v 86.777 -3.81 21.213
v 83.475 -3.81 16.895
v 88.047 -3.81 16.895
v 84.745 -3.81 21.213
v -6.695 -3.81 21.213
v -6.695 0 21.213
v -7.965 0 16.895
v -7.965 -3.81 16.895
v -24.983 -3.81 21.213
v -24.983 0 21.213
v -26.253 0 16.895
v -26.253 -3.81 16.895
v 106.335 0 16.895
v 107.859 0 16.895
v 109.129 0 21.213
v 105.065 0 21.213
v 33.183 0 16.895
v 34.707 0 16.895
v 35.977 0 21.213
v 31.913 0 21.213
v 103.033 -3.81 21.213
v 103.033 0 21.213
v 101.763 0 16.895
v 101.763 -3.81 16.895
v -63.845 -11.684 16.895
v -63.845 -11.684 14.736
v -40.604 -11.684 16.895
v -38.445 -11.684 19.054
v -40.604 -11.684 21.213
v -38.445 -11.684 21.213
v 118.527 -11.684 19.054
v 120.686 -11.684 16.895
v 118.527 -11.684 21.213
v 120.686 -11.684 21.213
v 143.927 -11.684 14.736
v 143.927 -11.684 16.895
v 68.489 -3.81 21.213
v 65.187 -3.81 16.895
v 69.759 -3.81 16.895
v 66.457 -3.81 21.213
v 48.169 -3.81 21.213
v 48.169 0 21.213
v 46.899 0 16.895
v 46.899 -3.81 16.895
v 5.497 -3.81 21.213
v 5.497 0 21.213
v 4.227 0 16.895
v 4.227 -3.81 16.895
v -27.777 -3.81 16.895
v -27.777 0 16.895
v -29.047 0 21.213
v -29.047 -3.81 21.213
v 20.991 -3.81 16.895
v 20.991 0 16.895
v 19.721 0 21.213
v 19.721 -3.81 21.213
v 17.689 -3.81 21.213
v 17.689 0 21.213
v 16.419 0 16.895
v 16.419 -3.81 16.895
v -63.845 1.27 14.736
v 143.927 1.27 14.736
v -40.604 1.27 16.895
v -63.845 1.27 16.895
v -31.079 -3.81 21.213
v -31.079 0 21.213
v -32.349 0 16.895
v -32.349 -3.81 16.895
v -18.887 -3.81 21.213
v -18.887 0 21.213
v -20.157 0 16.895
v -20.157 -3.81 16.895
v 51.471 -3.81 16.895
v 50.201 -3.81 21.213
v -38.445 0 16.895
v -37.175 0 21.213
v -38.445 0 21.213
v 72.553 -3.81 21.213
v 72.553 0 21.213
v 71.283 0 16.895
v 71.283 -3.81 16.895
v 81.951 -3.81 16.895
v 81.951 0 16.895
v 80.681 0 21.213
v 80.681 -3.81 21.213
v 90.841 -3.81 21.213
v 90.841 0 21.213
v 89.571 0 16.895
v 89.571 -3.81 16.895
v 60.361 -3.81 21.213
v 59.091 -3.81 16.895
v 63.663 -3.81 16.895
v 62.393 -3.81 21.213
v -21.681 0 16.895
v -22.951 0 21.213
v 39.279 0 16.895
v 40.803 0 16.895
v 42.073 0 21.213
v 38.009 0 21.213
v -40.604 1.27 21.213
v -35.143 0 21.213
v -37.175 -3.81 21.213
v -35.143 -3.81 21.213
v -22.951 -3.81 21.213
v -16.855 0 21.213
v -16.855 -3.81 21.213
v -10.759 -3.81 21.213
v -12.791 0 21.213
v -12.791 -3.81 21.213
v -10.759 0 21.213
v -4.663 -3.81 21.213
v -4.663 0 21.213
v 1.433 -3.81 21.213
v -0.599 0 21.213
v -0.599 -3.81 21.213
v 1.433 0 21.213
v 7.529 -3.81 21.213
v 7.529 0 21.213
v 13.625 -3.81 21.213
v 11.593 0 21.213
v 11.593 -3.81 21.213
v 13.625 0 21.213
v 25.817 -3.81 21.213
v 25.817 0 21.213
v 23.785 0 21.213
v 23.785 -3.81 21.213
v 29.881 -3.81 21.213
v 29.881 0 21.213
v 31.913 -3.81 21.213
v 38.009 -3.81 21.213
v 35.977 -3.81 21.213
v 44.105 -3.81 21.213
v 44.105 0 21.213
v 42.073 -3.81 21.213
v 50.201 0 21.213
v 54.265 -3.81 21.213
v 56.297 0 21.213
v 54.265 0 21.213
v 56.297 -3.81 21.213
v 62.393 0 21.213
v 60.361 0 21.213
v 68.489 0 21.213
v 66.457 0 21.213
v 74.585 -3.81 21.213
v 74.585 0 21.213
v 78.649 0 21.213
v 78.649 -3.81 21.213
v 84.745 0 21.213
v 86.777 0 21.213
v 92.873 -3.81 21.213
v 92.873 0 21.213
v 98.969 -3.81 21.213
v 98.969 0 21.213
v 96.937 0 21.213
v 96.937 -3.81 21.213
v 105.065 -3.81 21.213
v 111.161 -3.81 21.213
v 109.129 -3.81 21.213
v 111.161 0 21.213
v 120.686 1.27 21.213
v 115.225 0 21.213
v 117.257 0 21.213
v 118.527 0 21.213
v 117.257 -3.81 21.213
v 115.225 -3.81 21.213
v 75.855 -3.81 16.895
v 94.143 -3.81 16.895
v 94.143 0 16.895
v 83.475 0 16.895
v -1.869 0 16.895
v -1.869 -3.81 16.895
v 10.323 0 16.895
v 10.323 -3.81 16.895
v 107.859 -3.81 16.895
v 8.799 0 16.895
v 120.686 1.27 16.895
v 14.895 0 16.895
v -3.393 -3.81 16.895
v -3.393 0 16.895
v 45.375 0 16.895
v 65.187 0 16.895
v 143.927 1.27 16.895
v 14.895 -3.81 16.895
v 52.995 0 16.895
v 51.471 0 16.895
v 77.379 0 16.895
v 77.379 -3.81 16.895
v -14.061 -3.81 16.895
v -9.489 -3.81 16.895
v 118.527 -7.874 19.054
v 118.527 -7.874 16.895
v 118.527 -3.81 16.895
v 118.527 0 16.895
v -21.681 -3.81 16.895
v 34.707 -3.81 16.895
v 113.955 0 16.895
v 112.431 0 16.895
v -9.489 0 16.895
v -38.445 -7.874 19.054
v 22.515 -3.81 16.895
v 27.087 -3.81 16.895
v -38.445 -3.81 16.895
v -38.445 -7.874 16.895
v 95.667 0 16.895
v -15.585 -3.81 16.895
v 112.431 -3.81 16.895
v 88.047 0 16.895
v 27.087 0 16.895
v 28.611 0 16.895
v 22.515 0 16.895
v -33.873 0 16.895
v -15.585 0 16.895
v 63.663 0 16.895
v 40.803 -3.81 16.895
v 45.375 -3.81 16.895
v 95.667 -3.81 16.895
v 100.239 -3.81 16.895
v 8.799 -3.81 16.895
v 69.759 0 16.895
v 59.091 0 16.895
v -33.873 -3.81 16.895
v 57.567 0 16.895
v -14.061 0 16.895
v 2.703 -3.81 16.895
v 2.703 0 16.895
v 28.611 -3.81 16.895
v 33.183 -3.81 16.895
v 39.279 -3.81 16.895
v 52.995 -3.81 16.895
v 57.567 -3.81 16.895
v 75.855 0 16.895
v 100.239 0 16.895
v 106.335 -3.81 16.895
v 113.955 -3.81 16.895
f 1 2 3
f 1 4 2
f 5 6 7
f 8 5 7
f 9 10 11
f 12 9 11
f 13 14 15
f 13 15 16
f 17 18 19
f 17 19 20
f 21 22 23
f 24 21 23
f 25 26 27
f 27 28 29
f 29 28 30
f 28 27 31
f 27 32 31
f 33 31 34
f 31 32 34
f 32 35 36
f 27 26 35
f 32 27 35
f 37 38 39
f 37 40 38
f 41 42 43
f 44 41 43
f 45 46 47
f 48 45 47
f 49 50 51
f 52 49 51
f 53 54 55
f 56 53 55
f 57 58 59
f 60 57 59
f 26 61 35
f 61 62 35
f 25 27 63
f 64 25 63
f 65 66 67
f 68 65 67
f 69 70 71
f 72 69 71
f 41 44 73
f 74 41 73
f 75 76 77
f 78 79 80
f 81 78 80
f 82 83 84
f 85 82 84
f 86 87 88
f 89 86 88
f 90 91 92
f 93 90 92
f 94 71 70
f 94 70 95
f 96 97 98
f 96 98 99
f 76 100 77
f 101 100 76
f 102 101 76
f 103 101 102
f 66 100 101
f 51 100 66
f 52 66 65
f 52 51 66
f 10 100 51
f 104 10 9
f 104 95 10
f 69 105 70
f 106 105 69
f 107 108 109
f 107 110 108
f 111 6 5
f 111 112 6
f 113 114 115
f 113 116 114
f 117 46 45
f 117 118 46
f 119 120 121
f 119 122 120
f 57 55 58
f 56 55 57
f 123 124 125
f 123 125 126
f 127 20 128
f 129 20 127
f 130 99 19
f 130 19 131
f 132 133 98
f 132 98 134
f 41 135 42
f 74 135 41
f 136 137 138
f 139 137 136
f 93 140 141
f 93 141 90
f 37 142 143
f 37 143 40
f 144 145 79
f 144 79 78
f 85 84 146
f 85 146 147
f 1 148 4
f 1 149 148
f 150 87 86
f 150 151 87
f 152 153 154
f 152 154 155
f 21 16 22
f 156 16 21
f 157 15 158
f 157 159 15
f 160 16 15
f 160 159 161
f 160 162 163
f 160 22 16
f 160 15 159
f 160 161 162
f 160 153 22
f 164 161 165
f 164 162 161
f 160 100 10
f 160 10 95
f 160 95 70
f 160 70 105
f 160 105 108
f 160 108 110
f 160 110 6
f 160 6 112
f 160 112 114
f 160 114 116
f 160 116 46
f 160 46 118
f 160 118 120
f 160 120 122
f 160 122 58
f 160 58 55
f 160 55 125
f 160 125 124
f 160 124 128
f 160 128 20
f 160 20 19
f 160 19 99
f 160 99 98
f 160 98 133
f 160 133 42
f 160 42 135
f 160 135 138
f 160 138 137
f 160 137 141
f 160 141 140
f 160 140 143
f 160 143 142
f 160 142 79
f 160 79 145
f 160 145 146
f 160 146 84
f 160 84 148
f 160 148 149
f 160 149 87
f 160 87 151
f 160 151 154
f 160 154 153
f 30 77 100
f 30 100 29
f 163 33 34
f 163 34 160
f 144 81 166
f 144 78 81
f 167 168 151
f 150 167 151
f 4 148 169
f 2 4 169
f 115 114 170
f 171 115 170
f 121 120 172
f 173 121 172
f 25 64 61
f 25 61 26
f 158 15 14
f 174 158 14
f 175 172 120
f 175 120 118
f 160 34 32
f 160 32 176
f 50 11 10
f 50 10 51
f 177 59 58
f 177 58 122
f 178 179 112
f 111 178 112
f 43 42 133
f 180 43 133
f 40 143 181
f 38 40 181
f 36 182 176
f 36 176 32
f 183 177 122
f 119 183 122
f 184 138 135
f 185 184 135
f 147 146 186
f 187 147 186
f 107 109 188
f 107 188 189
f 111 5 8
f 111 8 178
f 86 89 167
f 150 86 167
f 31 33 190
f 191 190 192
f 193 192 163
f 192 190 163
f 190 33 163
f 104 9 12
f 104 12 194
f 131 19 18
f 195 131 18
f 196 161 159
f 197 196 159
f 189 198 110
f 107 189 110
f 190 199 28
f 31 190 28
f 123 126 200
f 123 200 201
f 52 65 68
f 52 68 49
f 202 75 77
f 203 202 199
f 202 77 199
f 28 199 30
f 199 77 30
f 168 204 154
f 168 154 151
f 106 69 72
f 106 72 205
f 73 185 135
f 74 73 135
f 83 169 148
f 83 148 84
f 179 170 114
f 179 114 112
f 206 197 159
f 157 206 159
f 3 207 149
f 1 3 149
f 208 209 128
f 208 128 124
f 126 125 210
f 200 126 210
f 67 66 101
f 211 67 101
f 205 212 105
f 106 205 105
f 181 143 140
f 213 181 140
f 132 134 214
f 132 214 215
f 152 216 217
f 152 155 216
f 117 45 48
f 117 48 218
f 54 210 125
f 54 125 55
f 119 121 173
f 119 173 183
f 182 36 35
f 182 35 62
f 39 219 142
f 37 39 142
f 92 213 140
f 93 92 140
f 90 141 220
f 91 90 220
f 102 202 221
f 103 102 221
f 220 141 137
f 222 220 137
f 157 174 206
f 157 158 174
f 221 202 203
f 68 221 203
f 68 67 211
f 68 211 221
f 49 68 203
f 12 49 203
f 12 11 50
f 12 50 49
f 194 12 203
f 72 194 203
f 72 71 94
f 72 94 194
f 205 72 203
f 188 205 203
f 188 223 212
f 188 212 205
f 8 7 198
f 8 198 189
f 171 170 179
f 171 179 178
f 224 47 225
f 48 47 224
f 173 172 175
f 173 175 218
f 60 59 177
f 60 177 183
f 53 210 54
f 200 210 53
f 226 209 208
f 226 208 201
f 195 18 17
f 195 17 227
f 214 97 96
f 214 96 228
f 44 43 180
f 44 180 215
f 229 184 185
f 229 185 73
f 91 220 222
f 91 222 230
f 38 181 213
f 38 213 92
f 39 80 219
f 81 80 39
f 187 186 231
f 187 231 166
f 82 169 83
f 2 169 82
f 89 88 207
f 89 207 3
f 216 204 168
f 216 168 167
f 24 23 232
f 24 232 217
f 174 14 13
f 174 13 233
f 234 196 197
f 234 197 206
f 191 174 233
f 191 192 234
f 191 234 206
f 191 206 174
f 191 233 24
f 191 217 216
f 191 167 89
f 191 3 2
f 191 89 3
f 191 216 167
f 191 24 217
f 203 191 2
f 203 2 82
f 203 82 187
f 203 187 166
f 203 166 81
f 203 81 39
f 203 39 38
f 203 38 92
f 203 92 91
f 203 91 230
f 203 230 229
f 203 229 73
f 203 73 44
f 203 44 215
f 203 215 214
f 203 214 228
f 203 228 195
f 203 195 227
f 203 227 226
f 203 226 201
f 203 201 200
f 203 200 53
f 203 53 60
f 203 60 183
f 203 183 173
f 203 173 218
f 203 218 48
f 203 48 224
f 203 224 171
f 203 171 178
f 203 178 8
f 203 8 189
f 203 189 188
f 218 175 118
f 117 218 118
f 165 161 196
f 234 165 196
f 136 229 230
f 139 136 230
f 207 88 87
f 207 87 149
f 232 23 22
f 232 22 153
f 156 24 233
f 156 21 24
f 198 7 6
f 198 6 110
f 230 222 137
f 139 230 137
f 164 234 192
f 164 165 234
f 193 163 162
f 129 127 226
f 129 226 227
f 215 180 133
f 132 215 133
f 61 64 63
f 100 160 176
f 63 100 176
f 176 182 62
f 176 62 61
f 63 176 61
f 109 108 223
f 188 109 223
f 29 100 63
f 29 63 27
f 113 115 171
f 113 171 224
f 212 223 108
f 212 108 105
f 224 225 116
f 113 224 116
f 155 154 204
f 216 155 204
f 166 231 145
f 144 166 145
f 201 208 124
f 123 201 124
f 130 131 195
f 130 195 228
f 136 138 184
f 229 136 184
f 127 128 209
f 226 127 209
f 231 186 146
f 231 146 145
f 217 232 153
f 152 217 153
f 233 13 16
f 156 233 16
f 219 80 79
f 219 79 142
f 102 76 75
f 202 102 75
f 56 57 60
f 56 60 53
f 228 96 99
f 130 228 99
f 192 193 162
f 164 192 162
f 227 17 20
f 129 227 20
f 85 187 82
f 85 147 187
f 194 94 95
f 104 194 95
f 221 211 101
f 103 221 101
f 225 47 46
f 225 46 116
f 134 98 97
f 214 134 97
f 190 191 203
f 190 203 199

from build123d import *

# Parameters (mm, degrees)
F1_DEPTH  = 3.81
F5_DEPTH  = 156.972
F7_DEPTH  = 1.27
F9_W      = 12.954
F9_H      = 2.159
F9_H_2    = 4.318
F10_DEPTH = 2.159
F11_DEPTH = 25.4
F12_W     = 12.954
F12_H     = 4.318
F12_H_2   = 2.159
F13_DEPTH = 2.159
F14_DEPTH = 25.4


with BuildPart() as f1:
    # F0 (on Front) → F1 (new body)
    with BuildSketch(Plane.XZ):
        Polygon((-37.1748663006, 21.2125933835), (-38.4448663006, 16.8945933835), (-33.8728663006, 16.8945933835), (-35.1428663006, 21.2125933835), align=None)
        Polygon((-33.8728663006, 16.8945933835), (-38.4448663006, 16.8945933835), (-38.4448663006, 14.7355933835), (118.5271336994, 14.7355933835), (118.5271336994, 16.8945933835), (113.9551336994, 16.8945933835), (112.4311336994, 16.8945933835), (107.8591336994, 16.8945933835), (106.3351336994, 16.8945933835), (101.7631336994, 16.8945933835), (100.2391336994, 16.8945933835), (95.6671336994, 16.8945933835), (94.1431336994, 16.8945933835), (89.5711336994, 16.8945933835), (88.0471336994, 16.8945933835), (83.4751336994, 16.8945933835), (81.9511336994, 16.8945933835), (77.3791336994, 16.8945933835), (75.8551336994, 16.8945933835), (71.2831336994, 16.8945933835), (69.7591336994, 16.8945933835), (65.1871336994, 16.8945933835), (63.6631336994, 16.8945933835), (59.0911336994, 16.8945933835), (57.5671336994, 16.8945933835), (52.9951336994, 16.8945933835), (51.4711336994, 16.8945933835), (46.8991336994, 16.8945933835), (45.3751336994, 16.8945933835), (40.8031336994, 16.8945933835), (39.2791336994, 16.8945933835), (34.7071336994, 16.8945933835), (33.1831336994, 16.8945933835), (28.6111336994, 16.8945933835), (27.0871336994, 16.8945933835), (22.5151336994, 16.8945933835), (20.9911336994, 16.8945933835), (16.4191336994, 16.8945933835), (14.8951336994, 16.8945933835), (10.3231336994, 16.8945933835), (8.7991336994, 16.8945933835), (4.2271336994, 16.8945933835), (2.7031336994, 16.8945933835), (-1.8688663006, 16.8945933835), (-3.3928663006, 16.8945933835), (-7.9648663006, 16.8945933835), (-9.4888663006, 16.8945933835), (-14.0608663006, 16.8945933835), (-15.5848663006, 16.8945933835), (-20.1568663006, 16.8945933835), (-21.6808663006, 16.8945933835), (-26.2528663006, 16.8945933835), (-27.7768663006, 16.8945933835), (-32.3488663006, 16.8945933835), align=None)
        Polygon((-31.0788663006, 21.2125933835), (-32.3488663006, 16.8945933835), (-27.7768663006, 16.8945933835), (-29.0468663006, 21.2125933835), align=None)
        Polygon((113.9551336994, 16.8945933835), (118.5271336994, 16.8945933835), (117.2571336994, 21.2125933835), (115.2251336994, 21.2125933835), align=None)
        Polygon((-24.9828663006, 21.2125933835), (-26.2528663006, 16.8945933835), (-21.6808663006, 16.8945933835), (-22.9508663006, 21.2125933835), align=None)
        Polygon((107.8591336994, 16.8945933835), (112.4311336994, 16.8945933835), (111.1611336994, 21.2125933835), (109.1291336994, 21.2125933835), align=None)
        Polygon((-18.8868663006, 21.2125933835), (-20.1568663006, 16.8945933835), (-15.5848663006, 16.8945933835), (-16.8548663006, 21.2125933835), align=None)
        Polygon((101.7631336994, 16.8945933835), (106.3351336994, 16.8945933835), (105.0651336994, 21.2125933835), (103.0331336994, 21.2125933835), align=None)
        Polygon((-12.7908663006, 21.2125933835), (-14.0608663006, 16.8945933835), (-9.4888663006, 16.8945933835), (-10.7588663006, 21.2125933835), align=None)
        Polygon((95.6671336994, 16.8945933835), (100.2391336994, 16.8945933835), (98.9691336994, 21.2125933835), (96.9371336994, 21.2125933835), align=None)
        Polygon((-6.6948663006, 21.2125933835), (-7.9648663006, 16.8945933835), (-3.3928663006, 16.8945933835), (-4.6628663006, 21.2125933835), align=None)
        Polygon((89.5711336994, 16.8945933835), (94.1431336994, 16.8945933835), (92.8731336994, 21.2125933835), (90.8411336994, 21.2125933835), align=None)
        Polygon((-0.5988663006, 21.2125933835), (-1.8688663006, 16.8945933835), (2.7031336994, 16.8945933835), (1.4331336994, 21.2125933835), align=None)
        Polygon((83.4751336994, 16.8945933835), (88.0471336994, 16.8945933835), (86.7771336994, 21.2125933835), (84.7451336994, 21.2125933835), align=None)
        Polygon((5.4971336994, 21.2125933835), (4.2271336994, 16.8945933835), (8.7991336994, 16.8945933835), (7.5291336994, 21.2125933835), align=None)
        Polygon((77.3791336994, 16.8945933835), (81.9511336994, 16.8945933835), (80.6811336994, 21.2125933835), (78.6491336994, 21.2125933835), align=None)
        Polygon((11.5931336994, 21.2125933835), (10.3231336994, 16.8945933835), (14.8951336994, 16.8945933835), (13.6251336994, 21.2125933835), align=None)
        Polygon((71.2831336994, 16.8945933835), (75.8551336994, 16.8945933835), (74.5851336994, 21.2125933835), (72.5531336994, 21.2125933835), align=None)
        Polygon((17.6891336994, 21.2125933835), (16.4191336994, 16.8945933835), (20.9911336994, 16.8945933835), (19.7211336994, 21.2125933835), align=None)
        Polygon((65.1871336994, 16.8945933835), (69.7591336994, 16.8945933835), (68.4891336994, 21.2125933835), (66.4571336994, 21.2125933835), align=None)
        Polygon((23.7851336994, 21.2125933835), (22.5151336994, 16.8945933835), (27.0871336994, 16.8945933835), (25.8171336994, 21.2125933835), align=None)
        Polygon((59.0911336994, 16.8945933835), (63.6631336994, 16.8945933835), (62.3931336994, 21.2125933835), (60.3611336994, 21.2125933835), align=None)
        Polygon((29.8811336994, 21.2125933835), (28.6111336994, 16.8945933835), (33.1831336994, 16.8945933835), (31.9131336994, 21.2125933835), align=None)
        Polygon((52.9951336994, 16.8945933835), (57.5671336994, 16.8945933835), (56.2971336994, 21.2125933835), (54.2651336994, 21.2125933835), align=None)
        Polygon((35.9771336994, 21.2125933835), (34.7071336994, 16.8945933835), (39.2791336994, 16.8945933835), (38.0091336994, 21.2125933835), align=None)
        Polygon((46.8991336994, 16.8945933835), (51.4711336994, 16.8945933835), (50.2011336994, 21.2125933835), (48.1691336994, 21.2125933835), align=None)
        Polygon((42.0731336994, 21.2125933835), (40.8031336994, 16.8945933835), (45.3751336994, 16.8945933835), (44.1051336994, 21.2125933835), align=None)
    extrude(amount=F1_DEPTH)

    # F4 (on plane+point) → F5 (join, through all)
    with BuildSketch(Plane.YZ.offset(118.5271336994)):
        Polygon((-11.684, 14.7355933835), (-3.81, 14.7355933835), (-3.81, 16.8945933835), (-7.874, 16.8945933835), (-7.874, 19.0535933835), (-11.684, 19.0535933835), (-11.684, 16.8945933835), align=None)
    extrude(amount=-F5_DEPTH)

    # F6 (on face) → F7 (join)
    with BuildSketch(Plane(origin=(0, 0, 0), x_dir=(-1, 0, 0), z_dir=(0, 1, 0))):
        Polygon((33.8728663006, 16.8945933835), (35.1428663006, 21.2125933835), (31.0788663006, 21.2125933835), (32.3488663006, 16.8945933835), align=None)
        Polygon((27.7768663006, 16.8945933835), (29.0468663006, 21.2125933835), (24.9828663006, 21.2125933835), (26.2528663006, 16.8945933835), align=None)
        Polygon((21.6808663006, 16.8945933835), (22.9508663006, 21.2125933835), (18.8868663006, 21.2125933835), (20.1568663006, 16.8945933835), align=None)
        Polygon((15.5848663006, 16.8945933835), (16.8548663006, 21.2125933835), (12.7908663006, 21.2125933835), (14.0608663006, 16.8945933835), align=None)
        Polygon((9.4888663006, 16.8945933835), (10.7588663006, 21.2125933835), (6.6948663006, 21.2125933835), (7.9648663006, 16.8945933835), align=None)
        Polygon((3.3928663006, 16.8945933835), (4.6628663006, 21.2125933835), (0.5988663006, 21.2125933835), (1.8688663006, 16.8945933835), align=None)
        Polygon((-2.7031336994, 16.8945933835), (-1.4331336994, 21.2125933835), (-5.4971336994, 21.2125933835), (-4.2271336994, 16.8945933835), align=None)
        Polygon((-8.7991336994, 16.8945933835), (-7.5291336994, 21.2125933835), (-11.5931336994, 21.2125933835), (-10.3231336994, 16.8945933835), align=None)
        Polygon((-14.8951336994, 16.8945933835), (-13.6251336994, 21.2125933835), (-17.6891336994, 21.2125933835), (-16.4191336994, 16.8945933835), align=None)
        Polygon((-20.9911336994, 16.8945933835), (-19.7211336994, 21.2125933835), (-23.7851336994, 21.2125933835), (-22.5151336994, 16.8945933835), align=None)
        Polygon((-27.0871336994, 16.8945933835), (-25.8171336994, 21.2125933835), (-29.8811336994, 21.2125933835), (-28.6111336994, 16.8945933835), align=None)
        Polygon((-118.5271336994, 14.7355933835), (38.4448663006, 14.7355933835), (38.4448663006, 16.8945933835), (37.1748663006, 21.2125933835), (35.1428663006, 21.2125933835), (33.8728663006, 16.8945933835), (32.3488663006, 16.8945933835), (31.0788663006, 21.2125933835), (29.0468663006, 21.2125933835), (27.7768663006, 16.8945933835), (26.2528663006, 16.8945933835), (24.9828663006, 21.2125933835), (22.9508663006, 21.2125933835), (21.6808663006, 16.8945933835), (20.1568663006, 16.8945933835), (18.8868663006, 21.2125933835), (16.8548663006, 21.2125933835), (15.5848663006, 16.8945933835), (14.0608663006, 16.8945933835), (12.7908663006, 21.2125933835), (10.7588663006, 21.2125933835), (9.4888663006, 16.8945933835), (7.9648663006, 16.8945933835), (6.6948663006, 21.2125933835), (4.6628663006, 21.2125933835), (3.3928663006, 16.8945933835), (1.8688663006, 16.8945933835), (0.5988663006, 21.2125933835), (-1.4331336994, 21.2125933835), (-2.7031336994, 16.8945933835), (-4.2271336994, 16.8945933835), (-5.4971336994, 21.2125933835), (-7.5291336994, 21.2125933835), (-8.7991336994, 16.8945933835), (-10.3231336994, 16.8945933835), (-11.5931336994, 21.2125933835), (-13.6251336994, 21.2125933835), (-14.8951336994, 16.8945933835), (-16.4191336994, 16.8945933835), (-17.6891336994, 21.2125933835), (-19.7211336994, 21.2125933835), (-20.9911336994, 16.8945933835), (-22.5151336994, 16.8945933835), (-23.7851336994, 21.2125933835), (-25.8171336994, 21.2125933835), (-27.0871336994, 16.8945933835), (-28.6111336994, 16.8945933835), (-29.8811336994, 21.2125933835), (-31.9131336994, 21.2125933835), (-33.1831336994, 16.8945933835), (-34.7071336994, 16.8945933835), (-35.9771336994, 21.2125933835), (-38.0091336994, 21.2125933835), (-39.2791336994, 16.8945933835), (-40.8031336994, 16.8945933835), (-42.0731336994, 21.2125933835), (-44.1051336994, 21.2125933835), (-45.3751336994, 16.8945933835), (-46.8991336994, 16.8945933835), (-48.1691336994, 21.2125933835), (-50.2011336994, 21.2125933835), (-51.4711336994, 16.8945933835), (-52.9951336994, 16.8945933835), (-54.2651336994, 21.2125933835), (-56.2971336994, 21.2125933835), (-57.5671336994, 16.8945933835), (-59.0911336994, 16.8945933835), (-60.3611336994, 21.2125933835), (-62.3931336994, 21.2125933835), (-63.6631336994, 16.8945933835), (-65.1871336994, 16.8945933835), (-66.4571336994, 21.2125933835), (-68.4891336994, 21.2125933835), (-69.7591336994, 16.8945933835), (-71.2831336994, 16.8945933835), (-72.5531336994, 21.2125933835), (-74.5851336994, 21.2125933835), (-75.8551336994, 16.8945933835), (-77.3791336994, 16.8945933835), (-78.6491336994, 21.2125933835), (-80.6811336994, 21.2125933835), (-81.9511336994, 16.8945933835), (-83.4751336994, 16.8945933835), (-84.7451336994, 21.2125933835), (-86.7771336994, 21.2125933835), (-88.0471336994, 16.8945933835), (-89.5711336994, 16.8945933835), (-90.8411336994, 21.2125933835), (-92.8731336994, 21.2125933835), (-94.1431336994, 16.8945933835), (-95.6671336994, 16.8945933835), (-96.9371336994, 21.2125933835), (-98.9691336994, 21.2125933835), (-100.2391336994, 16.8945933835), (-101.7631336994, 16.8945933835), (-103.0331336994, 21.2125933835), (-105.0651336994, 21.2125933835), (-106.3351336994, 16.8945933835), (-107.8591336994, 16.8945933835), (-109.1291336994, 21.2125933835), (-111.1611336994, 21.2125933835), (-112.4311336994, 16.8945933835), (-113.9551336994, 16.8945933835), (-115.2251336994, 21.2125933835), (-117.2571336994, 21.2125933835), (-118.5271336994, 16.8945933835), align=None)
        Polygon((-111.1611336994, 21.2125933835), (-115.2251336994, 21.2125933835), (-113.9551336994, 16.8945933835), (-112.4311336994, 16.8945933835), align=None)
        Polygon((-105.0651336994, 21.2125933835), (-109.1291336994, 21.2125933835), (-107.8591336994, 16.8945933835), (-106.3351336994, 16.8945933835), align=None)
        Polygon((-98.9691336994, 21.2125933835), (-103.0331336994, 21.2125933835), (-101.7631336994, 16.8945933835), (-100.2391336994, 16.8945933835), align=None)
        Polygon((-92.8731336994, 21.2125933835), (-96.9371336994, 21.2125933835), (-95.6671336994, 16.8945933835), (-94.1431336994, 16.8945933835), align=None)
        Polygon((-86.7771336994, 21.2125933835), (-90.8411336994, 21.2125933835), (-89.5711336994, 16.8945933835), (-88.0471336994, 16.8945933835), align=None)
        Polygon((-80.6811336994, 21.2125933835), (-84.7451336994, 21.2125933835), (-83.4751336994, 16.8945933835), (-81.9511336994, 16.8945933835), align=None)
        Polygon((-74.5851336994, 21.2125933835), (-78.6491336994, 21.2125933835), (-77.3791336994, 16.8945933835), (-75.8551336994, 16.8945933835), align=None)
        Polygon((-68.4891336994, 21.2125933835), (-72.5531336994, 21.2125933835), (-71.2831336994, 16.8945933835), (-69.7591336994, 16.8945933835), align=None)
        Polygon((-62.3931336994, 21.2125933835), (-66.4571336994, 21.2125933835), (-65.1871336994, 16.8945933835), (-63.6631336994, 16.8945933835), align=None)
        Polygon((-56.2971336994, 21.2125933835), (-60.3611336994, 21.2125933835), (-59.0911336994, 16.8945933835), (-57.5671336994, 16.8945933835), align=None)
        Polygon((-50.2011336994, 21.2125933835), (-54.2651336994, 21.2125933835), (-52.9951336994, 16.8945933835), (-51.4711336994, 16.8945933835), align=None)
        Polygon((-44.1051336994, 21.2125933835), (-48.1691336994, 21.2125933835), (-46.8991336994, 16.8945933835), (-45.3751336994, 16.8945933835), align=None)
        Polygon((-39.2791336994, 16.8945933835), (-38.0091336994, 21.2125933835), (-42.0731336994, 21.2125933835), (-40.8031336994, 16.8945933835), align=None)
        Polygon((-33.1831336994, 16.8945933835), (-31.9131336994, 21.2125933835), (-35.9771336994, 21.2125933835), (-34.7071336994, 16.8945933835), align=None)
        Polygon((-118.5271336994, 21.2125933835), (-118.5271336994, 16.8945933835), (-117.2571336994, 21.2125933835), align=None)
        Polygon((37.1748663006, 21.2125933835), (38.4448663006, 16.8945933835), (38.4448663006, 21.2125933835), align=None)
    extrude(amount=F7_DEPTH)

    # F9 (on face) → F10 (join)
    with BuildSketch(Plane.YZ.offset(118.5271336994)):
        with Locations((-5.207, 15.8150933835)):
            Rectangle(F9_W, F9_H)
        with Locations((-5.207, 19.0535933835)):
            Rectangle(F9_W, F9_H_2)
    extrude(amount=F10_DEPTH)

    # F9 (on face) → F11 (join)
    with BuildSketch(Plane.YZ.offset(118.5271336994)):
        Polygon((-11.684, 16.8945933835), (-11.684, 14.7355933835), (1.27, 14.7355933835), (1.27, 16.8945933835), (0, 16.8945933835), (-3.81, 16.8945933835), (-7.874, 16.8945933835), align=None)
    extrude(amount=F11_DEPTH)

    # F12 (on face) → F13 (join)
    with BuildSketch(Plane(origin=(-38.4448663006, 0, 0), x_dir=(0, -1, 0), z_dir=(-1, 0, 0))):
        with Locations((5.207, 19.0535933835)):
            Rectangle(F12_W, F12_H)
        with Locations((5.207, 15.8150933835)):
            Rectangle(F12_W, F12_H_2)
    extrude(amount=F13_DEPTH)

    # F12 (on face) → F14 (join)
    with BuildSketch(Plane(origin=(-38.4448663006, 0, 0), x_dir=(0, -1, 0), z_dir=(-1, 0, 0))):
        Polygon((3.81, 16.8945933835), (0, 16.8945933835), (-1.27, 16.8945933835), (-1.27, 14.7355933835), (11.684, 14.7355933835), (11.684, 16.8945933835), (7.874, 16.8945933835), align=None)
    extrude(amount=F14_DEPTH)


solid = f1.part
